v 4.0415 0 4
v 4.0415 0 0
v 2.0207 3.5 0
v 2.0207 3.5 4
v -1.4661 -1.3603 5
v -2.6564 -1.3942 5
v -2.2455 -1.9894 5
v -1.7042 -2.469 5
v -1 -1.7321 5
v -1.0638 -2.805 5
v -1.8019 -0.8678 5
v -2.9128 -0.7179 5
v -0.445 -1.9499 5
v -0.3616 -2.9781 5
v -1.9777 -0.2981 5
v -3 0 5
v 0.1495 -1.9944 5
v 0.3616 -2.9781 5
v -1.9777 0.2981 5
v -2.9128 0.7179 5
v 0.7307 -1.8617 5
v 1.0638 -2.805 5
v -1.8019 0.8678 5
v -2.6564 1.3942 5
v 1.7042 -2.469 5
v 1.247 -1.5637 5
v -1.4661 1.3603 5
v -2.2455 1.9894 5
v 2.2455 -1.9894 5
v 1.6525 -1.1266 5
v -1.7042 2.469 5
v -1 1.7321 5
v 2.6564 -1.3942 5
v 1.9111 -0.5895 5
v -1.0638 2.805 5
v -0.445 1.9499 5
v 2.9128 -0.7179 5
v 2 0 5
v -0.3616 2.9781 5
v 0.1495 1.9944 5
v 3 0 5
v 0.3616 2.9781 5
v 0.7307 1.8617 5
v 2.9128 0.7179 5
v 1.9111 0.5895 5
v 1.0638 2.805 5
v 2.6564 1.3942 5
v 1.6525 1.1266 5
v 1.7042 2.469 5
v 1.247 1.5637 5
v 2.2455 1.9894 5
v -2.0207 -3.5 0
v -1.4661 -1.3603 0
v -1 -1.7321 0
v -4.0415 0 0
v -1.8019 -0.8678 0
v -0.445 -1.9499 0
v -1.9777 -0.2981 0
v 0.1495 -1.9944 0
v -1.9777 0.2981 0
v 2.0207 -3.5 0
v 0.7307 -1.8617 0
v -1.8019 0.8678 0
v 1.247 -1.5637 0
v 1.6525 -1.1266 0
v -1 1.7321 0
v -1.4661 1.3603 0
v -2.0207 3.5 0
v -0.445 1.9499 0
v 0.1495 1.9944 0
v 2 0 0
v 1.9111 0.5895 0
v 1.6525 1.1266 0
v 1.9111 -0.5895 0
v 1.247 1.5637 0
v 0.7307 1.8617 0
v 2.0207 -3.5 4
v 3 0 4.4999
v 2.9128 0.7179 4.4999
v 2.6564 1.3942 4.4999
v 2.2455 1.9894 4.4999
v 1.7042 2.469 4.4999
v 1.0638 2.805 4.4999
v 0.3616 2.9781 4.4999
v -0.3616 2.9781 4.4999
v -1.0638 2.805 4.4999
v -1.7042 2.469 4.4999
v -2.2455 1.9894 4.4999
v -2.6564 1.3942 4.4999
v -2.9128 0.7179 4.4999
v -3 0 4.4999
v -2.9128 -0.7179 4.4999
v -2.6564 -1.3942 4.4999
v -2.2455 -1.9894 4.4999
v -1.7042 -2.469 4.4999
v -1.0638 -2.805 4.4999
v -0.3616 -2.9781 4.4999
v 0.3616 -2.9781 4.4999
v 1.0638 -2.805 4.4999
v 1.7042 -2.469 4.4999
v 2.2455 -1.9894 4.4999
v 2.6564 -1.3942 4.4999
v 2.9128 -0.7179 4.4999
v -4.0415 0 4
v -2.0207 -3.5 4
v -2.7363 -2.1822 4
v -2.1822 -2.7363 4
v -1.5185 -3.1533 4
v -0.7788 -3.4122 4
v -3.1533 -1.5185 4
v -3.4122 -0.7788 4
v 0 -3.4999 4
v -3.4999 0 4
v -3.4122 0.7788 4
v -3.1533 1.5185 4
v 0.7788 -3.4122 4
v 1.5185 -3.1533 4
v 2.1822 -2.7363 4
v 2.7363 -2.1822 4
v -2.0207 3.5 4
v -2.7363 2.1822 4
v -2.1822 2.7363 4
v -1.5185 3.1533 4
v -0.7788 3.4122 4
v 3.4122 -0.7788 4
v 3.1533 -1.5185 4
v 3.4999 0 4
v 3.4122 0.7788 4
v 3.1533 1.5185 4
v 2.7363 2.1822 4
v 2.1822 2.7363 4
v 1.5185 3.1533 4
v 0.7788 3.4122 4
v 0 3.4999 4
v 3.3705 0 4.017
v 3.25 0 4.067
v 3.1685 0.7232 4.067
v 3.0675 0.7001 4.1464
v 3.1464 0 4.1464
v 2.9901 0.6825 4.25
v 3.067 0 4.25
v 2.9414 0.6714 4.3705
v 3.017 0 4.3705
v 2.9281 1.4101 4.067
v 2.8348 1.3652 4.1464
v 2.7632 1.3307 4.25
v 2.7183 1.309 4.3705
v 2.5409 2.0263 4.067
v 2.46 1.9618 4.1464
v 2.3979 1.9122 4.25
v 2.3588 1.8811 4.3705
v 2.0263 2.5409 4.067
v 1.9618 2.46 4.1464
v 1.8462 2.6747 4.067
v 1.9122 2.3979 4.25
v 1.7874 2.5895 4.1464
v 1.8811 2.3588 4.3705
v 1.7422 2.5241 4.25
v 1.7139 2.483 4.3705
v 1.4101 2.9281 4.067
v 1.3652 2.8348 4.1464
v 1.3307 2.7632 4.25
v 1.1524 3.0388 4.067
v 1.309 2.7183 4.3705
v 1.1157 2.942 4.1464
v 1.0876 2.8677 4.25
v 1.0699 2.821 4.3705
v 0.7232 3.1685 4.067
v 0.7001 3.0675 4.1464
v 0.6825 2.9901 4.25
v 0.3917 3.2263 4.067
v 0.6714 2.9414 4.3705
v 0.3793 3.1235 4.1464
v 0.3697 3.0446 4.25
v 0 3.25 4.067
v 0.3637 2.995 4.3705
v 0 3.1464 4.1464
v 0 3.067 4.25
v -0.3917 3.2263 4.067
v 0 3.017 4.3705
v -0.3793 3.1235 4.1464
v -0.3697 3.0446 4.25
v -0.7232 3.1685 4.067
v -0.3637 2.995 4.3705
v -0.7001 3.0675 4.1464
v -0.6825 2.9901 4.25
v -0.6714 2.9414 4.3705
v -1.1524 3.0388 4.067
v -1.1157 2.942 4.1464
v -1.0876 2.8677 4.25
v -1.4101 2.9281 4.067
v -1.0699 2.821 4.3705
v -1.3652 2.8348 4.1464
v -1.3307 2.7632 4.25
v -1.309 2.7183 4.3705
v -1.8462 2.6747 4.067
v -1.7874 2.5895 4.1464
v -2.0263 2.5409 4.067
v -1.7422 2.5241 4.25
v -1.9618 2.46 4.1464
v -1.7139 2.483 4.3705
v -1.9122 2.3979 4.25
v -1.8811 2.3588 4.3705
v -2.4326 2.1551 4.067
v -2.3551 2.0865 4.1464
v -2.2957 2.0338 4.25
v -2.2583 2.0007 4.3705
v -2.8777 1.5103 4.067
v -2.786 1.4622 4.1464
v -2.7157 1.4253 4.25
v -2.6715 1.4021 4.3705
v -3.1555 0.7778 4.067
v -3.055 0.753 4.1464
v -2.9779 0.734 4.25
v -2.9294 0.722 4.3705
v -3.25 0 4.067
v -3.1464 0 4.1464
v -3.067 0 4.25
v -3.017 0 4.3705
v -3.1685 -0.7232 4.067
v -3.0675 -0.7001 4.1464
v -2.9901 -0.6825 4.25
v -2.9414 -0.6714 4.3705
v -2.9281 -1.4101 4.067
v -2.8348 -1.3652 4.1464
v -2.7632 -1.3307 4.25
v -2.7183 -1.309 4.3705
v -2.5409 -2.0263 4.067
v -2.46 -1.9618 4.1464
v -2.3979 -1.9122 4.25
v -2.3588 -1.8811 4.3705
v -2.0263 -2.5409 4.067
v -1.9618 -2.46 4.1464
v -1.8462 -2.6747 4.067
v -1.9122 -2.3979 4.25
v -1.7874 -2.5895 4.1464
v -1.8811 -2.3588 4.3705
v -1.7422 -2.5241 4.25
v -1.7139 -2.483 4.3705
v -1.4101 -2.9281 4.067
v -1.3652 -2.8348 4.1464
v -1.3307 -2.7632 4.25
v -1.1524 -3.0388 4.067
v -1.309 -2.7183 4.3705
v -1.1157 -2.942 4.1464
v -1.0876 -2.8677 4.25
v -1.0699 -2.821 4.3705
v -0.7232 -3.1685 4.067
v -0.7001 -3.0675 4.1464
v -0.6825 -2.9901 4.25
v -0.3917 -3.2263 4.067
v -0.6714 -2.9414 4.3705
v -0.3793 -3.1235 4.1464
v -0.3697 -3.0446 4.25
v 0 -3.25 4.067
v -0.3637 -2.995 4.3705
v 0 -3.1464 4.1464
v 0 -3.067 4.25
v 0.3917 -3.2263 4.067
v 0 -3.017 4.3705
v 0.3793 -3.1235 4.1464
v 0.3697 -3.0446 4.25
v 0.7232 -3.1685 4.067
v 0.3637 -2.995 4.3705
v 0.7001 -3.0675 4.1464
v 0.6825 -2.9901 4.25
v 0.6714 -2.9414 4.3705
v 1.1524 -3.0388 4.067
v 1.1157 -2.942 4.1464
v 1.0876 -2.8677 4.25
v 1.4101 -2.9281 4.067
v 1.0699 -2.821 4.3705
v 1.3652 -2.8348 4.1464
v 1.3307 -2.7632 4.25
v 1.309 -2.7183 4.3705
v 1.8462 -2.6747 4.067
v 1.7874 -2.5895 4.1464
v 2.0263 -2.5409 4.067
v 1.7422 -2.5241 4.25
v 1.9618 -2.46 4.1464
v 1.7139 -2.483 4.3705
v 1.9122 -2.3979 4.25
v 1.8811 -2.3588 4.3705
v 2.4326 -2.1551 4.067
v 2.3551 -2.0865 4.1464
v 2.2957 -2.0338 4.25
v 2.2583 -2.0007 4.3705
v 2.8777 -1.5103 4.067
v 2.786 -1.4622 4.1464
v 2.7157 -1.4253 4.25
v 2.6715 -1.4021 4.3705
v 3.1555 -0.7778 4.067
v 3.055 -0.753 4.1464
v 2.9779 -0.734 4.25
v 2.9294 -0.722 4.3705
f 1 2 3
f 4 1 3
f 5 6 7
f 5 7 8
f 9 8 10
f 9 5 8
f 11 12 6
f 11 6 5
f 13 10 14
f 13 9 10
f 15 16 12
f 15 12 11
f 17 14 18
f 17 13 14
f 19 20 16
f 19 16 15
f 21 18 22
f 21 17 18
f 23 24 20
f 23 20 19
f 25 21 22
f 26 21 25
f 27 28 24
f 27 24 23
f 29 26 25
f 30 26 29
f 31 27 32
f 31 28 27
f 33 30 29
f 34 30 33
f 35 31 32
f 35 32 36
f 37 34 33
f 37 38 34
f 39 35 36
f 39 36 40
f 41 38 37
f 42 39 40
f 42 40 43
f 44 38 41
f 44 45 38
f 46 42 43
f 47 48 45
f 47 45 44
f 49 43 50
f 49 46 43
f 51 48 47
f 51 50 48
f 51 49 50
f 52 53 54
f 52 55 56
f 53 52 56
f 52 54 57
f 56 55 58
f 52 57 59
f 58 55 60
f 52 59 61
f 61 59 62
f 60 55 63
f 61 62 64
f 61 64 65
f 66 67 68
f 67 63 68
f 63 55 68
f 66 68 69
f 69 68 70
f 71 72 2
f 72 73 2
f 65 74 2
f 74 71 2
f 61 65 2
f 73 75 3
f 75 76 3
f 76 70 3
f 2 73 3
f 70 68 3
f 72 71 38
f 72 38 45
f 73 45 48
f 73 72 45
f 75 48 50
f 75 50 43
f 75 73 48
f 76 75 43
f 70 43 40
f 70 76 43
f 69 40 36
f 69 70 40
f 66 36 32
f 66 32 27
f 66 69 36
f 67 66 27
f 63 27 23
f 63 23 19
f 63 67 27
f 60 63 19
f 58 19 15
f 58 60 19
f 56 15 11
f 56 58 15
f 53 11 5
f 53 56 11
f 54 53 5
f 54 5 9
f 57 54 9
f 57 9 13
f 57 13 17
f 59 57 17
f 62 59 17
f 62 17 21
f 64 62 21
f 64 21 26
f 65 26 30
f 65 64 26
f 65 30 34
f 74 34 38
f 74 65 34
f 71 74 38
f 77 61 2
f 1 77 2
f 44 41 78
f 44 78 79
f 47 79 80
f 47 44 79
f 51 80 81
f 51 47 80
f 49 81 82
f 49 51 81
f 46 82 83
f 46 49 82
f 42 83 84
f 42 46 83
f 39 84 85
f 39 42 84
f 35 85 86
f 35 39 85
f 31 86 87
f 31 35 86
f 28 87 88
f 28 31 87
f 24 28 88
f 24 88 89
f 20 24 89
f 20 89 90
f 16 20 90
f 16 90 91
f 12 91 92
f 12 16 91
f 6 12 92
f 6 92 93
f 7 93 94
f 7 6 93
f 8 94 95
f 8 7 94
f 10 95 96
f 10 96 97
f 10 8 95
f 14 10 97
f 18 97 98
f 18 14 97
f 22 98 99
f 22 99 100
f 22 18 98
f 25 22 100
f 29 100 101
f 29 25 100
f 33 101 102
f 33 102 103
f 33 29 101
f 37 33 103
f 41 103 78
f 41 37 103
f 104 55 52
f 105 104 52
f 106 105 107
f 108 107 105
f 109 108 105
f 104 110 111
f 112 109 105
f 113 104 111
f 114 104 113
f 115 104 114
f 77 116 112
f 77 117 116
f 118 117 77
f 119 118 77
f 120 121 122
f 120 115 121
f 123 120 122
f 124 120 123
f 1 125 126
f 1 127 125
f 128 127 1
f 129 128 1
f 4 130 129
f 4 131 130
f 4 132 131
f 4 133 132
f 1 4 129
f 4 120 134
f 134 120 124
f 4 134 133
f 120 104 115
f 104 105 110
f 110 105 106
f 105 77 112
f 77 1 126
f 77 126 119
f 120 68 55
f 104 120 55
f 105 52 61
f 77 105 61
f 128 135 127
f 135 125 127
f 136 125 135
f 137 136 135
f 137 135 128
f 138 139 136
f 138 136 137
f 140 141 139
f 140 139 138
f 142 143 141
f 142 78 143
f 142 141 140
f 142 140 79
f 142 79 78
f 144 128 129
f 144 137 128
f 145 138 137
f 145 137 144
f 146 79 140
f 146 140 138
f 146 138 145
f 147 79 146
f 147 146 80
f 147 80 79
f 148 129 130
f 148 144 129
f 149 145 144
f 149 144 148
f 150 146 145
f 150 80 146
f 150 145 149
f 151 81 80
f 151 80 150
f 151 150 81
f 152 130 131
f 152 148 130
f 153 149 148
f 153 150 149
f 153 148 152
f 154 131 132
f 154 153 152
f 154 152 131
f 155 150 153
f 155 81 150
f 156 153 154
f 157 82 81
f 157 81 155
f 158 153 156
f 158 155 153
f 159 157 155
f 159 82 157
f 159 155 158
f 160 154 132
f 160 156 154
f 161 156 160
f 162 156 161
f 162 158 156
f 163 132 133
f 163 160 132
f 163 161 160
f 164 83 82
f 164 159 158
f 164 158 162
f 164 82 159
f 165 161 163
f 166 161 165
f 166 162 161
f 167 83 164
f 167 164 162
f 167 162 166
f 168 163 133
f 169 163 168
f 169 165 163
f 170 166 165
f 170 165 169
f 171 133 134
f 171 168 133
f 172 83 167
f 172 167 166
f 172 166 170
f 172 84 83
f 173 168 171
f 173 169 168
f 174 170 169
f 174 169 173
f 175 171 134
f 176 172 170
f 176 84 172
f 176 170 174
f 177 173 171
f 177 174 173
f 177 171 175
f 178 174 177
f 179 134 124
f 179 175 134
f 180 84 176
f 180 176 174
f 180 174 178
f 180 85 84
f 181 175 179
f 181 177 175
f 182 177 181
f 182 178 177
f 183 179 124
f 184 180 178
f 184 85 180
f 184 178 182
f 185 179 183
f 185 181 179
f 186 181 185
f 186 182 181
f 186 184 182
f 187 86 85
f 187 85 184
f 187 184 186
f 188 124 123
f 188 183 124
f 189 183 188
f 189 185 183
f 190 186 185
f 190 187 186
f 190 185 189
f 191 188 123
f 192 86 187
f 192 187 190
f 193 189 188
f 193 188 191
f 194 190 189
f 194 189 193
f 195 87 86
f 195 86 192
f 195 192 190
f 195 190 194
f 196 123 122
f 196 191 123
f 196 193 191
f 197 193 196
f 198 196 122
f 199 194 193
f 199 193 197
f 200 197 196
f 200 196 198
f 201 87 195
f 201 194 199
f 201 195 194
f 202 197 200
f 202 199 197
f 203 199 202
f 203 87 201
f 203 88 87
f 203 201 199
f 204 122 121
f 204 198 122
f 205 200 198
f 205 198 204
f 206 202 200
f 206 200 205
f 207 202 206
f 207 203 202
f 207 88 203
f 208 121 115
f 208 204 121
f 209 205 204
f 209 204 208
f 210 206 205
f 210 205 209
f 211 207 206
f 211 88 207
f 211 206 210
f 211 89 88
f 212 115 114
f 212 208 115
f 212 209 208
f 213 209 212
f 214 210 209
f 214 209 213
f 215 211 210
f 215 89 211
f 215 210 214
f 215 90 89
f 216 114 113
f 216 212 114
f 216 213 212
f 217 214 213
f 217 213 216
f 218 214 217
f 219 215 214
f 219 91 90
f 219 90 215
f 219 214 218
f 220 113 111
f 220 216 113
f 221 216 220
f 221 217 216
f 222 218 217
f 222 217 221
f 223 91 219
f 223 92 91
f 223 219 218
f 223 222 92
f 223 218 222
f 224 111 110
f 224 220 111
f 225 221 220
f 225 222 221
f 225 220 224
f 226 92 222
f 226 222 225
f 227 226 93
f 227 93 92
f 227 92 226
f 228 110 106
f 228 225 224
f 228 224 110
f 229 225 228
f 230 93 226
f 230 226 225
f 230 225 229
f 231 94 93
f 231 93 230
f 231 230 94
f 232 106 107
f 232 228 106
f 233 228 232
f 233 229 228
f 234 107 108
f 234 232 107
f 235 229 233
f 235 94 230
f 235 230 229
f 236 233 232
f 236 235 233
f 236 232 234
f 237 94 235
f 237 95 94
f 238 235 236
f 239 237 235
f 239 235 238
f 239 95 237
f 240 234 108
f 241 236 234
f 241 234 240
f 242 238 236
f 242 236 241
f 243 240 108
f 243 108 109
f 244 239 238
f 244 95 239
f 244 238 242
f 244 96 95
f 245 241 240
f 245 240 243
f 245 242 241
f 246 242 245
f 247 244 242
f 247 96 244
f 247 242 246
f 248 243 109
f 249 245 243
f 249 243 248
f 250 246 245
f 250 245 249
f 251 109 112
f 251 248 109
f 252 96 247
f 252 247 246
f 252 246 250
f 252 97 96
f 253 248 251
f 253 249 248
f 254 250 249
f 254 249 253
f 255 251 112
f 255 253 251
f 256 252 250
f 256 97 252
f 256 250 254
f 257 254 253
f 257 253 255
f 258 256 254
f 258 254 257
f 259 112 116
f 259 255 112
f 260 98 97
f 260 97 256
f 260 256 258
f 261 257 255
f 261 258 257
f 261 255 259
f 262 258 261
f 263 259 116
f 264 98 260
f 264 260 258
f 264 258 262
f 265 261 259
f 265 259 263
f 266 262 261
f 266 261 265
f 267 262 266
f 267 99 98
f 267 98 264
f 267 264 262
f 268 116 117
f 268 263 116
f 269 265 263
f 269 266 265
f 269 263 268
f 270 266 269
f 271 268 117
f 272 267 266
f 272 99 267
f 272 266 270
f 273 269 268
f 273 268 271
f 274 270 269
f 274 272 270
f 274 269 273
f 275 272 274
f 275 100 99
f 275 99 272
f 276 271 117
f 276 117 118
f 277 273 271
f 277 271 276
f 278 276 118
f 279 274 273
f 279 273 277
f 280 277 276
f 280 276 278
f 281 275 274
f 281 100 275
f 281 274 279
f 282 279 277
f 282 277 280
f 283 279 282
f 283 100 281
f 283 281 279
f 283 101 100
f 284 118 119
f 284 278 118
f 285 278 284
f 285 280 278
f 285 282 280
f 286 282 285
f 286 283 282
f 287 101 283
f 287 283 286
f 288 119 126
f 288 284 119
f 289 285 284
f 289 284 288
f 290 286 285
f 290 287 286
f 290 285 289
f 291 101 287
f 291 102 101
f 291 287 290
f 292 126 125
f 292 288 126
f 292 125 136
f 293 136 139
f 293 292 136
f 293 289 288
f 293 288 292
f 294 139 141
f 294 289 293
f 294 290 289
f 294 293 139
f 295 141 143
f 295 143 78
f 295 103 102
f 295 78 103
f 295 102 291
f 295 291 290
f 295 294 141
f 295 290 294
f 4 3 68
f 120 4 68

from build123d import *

# Parameters (mm, degrees)
SKETCH_1_R          = 2
EXTRUDE_1_DEPTH     = 5
SKETCH_2_R          = 3
CUT_EXTRUDE_1_DEPTH = 1
FILLET_1_R          = 0.5


with BuildPart() as part:
    # 草图1 → 凸台-拉伸1 (new body)
    with BuildSketch(Plane.XY):
        Polygon((4.041451884, 0), (2.020725942, 3.5), (-2.020725942, 3.5), (-4.041451884, 0), (-2.020725942, -3.5), (2.020725942, -3.5), align=None)
        Circle(SKETCH_1_R, mode=Mode.SUBTRACT)
    extrude(amount=EXTRUDE_1_DEPTH)

    # 草图2 → 切除-拉伸1 (cut)
    with BuildSketch(Plane.XY.offset(5)):
        Polygon((4.041451884, 0), (2.020725942, 3.5), (-2.020725942, 3.5), (-4.041451884, 0), (-2.020725942, -3.5), (2.020725942, -3.5), align=None)
        Circle(SKETCH_2_R, mode=Mode.SUBTRACT)
    extrude(amount=-CUT_EXTRUDE_1_DEPTH, mode=Mode.SUBTRACT)

    # 圆角1
    fillet_1_edges = [part.edges().sort_by_distance(p)[0] for p in [
        (-3, 0, 4),
    ]]
    fillet(fillet_1_edges, radius=FILLET_1_R - 0.0001)  # a hair under: the kernel refuses the full size


solid = part.part
